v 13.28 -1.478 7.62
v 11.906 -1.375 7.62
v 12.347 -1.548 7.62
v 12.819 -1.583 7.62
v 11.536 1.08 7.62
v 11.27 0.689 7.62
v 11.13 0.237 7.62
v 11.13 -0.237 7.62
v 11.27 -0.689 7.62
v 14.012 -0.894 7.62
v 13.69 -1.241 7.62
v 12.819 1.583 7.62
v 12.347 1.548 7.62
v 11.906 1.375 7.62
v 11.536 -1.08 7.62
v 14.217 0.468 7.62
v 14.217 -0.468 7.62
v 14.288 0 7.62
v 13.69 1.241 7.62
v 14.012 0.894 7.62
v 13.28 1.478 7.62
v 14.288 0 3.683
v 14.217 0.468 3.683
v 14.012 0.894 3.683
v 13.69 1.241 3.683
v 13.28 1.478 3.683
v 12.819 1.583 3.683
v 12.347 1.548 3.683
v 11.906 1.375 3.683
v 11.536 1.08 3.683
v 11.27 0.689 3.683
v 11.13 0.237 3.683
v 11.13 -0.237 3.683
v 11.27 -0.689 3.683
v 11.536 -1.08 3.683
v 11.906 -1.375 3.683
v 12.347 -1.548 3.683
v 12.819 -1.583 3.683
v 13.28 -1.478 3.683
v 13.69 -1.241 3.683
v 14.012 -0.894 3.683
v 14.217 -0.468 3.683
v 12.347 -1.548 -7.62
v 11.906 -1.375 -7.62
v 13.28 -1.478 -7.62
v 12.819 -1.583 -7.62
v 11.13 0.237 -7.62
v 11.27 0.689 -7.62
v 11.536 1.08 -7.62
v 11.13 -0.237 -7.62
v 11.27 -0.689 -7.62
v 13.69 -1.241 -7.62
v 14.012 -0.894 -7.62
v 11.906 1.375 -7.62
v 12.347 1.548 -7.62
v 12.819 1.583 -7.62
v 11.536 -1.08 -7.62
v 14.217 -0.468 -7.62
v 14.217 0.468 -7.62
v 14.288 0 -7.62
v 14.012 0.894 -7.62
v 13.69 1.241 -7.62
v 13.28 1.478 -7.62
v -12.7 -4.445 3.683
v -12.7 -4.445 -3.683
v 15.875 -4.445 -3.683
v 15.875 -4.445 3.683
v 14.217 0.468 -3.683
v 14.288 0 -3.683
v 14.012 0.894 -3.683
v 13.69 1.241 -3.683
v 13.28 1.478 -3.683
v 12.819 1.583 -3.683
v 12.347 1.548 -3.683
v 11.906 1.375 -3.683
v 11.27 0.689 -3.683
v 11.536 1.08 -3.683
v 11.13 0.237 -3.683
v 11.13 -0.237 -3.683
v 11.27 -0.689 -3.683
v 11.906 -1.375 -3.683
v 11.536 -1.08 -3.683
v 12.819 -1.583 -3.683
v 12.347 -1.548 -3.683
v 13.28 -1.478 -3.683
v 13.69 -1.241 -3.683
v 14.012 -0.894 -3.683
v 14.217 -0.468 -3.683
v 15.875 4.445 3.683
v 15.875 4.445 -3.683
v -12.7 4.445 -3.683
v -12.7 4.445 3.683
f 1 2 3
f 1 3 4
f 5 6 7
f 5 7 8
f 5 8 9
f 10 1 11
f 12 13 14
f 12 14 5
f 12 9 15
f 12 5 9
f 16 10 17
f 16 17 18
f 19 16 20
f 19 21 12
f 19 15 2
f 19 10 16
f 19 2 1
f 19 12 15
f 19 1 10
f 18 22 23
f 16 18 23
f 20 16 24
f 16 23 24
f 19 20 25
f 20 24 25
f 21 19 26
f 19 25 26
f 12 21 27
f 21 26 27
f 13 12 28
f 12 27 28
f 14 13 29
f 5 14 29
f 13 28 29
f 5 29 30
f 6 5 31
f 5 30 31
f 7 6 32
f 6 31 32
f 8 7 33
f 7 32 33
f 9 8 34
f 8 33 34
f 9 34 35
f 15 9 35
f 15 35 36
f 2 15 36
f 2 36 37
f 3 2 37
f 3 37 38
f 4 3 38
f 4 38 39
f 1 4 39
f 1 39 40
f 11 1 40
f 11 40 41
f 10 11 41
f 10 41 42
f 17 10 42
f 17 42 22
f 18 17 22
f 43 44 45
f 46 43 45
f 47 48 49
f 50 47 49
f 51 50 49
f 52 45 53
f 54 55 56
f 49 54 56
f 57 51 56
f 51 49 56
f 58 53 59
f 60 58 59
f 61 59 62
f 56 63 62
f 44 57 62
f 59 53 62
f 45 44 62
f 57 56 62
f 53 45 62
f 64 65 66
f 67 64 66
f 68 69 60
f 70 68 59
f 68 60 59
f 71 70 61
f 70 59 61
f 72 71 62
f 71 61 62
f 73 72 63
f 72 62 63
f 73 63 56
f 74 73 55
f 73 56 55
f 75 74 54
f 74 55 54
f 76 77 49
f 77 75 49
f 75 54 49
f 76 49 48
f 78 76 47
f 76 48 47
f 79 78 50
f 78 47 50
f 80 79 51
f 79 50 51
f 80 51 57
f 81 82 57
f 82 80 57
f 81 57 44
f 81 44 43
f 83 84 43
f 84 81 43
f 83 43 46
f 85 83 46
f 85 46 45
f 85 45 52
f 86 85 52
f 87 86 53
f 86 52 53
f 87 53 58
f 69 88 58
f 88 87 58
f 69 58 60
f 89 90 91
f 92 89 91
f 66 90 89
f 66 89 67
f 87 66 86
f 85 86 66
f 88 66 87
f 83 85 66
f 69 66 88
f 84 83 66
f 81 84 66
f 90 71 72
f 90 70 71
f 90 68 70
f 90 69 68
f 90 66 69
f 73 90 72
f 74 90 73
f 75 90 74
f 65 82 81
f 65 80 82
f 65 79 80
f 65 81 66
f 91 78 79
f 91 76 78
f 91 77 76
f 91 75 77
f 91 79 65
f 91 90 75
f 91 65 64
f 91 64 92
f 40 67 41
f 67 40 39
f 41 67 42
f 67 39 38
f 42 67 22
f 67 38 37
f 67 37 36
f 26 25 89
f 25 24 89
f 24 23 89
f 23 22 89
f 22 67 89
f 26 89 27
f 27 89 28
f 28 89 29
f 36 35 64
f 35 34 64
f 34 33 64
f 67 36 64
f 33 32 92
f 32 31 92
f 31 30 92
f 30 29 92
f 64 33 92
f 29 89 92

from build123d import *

# Parameters (mm, degrees)
EXTRUDE1_DEPTH           = 3.683
EXTRUDE1_DEPTH_BACK      = 3.683
BOSS_EXTRUDE1_DEPTH      = 7.62
BOSS_EXTRUDE1_DEPTH_BACK = 7.62
SKETCH4_R                = 1.5875


with BuildPart() as part:
    # Sketch1 → Extrude1 (new, two sides: drawn at the far end of the back side and taken through both)
    with BuildSketch(Plane.XY.offset(-EXTRUDE1_DEPTH_BACK)):
        Polygon((-12.7, 4.445), (12.7, 4.445), (15.875, 4.445), (15.875, -4.445), (12.7, -4.445), (-12.7, -4.445), align=None)
    extrude(amount=EXTRUDE1_DEPTH + EXTRUDE1_DEPTH_BACK)

    # Sketch4 → Boss-Extrude1 (add, two sides: drawn at the far end of the back side and taken through both)
    with BuildSketch(Plane.XY.offset(-BOSS_EXTRUDE1_DEPTH_BACK)):
        with Locations((12.7, 0)):
            Circle(SKETCH4_R)
    extrude(amount=BOSS_EXTRUDE1_DEPTH + BOSS_EXTRUDE1_DEPTH_BACK)


solid = part.part
